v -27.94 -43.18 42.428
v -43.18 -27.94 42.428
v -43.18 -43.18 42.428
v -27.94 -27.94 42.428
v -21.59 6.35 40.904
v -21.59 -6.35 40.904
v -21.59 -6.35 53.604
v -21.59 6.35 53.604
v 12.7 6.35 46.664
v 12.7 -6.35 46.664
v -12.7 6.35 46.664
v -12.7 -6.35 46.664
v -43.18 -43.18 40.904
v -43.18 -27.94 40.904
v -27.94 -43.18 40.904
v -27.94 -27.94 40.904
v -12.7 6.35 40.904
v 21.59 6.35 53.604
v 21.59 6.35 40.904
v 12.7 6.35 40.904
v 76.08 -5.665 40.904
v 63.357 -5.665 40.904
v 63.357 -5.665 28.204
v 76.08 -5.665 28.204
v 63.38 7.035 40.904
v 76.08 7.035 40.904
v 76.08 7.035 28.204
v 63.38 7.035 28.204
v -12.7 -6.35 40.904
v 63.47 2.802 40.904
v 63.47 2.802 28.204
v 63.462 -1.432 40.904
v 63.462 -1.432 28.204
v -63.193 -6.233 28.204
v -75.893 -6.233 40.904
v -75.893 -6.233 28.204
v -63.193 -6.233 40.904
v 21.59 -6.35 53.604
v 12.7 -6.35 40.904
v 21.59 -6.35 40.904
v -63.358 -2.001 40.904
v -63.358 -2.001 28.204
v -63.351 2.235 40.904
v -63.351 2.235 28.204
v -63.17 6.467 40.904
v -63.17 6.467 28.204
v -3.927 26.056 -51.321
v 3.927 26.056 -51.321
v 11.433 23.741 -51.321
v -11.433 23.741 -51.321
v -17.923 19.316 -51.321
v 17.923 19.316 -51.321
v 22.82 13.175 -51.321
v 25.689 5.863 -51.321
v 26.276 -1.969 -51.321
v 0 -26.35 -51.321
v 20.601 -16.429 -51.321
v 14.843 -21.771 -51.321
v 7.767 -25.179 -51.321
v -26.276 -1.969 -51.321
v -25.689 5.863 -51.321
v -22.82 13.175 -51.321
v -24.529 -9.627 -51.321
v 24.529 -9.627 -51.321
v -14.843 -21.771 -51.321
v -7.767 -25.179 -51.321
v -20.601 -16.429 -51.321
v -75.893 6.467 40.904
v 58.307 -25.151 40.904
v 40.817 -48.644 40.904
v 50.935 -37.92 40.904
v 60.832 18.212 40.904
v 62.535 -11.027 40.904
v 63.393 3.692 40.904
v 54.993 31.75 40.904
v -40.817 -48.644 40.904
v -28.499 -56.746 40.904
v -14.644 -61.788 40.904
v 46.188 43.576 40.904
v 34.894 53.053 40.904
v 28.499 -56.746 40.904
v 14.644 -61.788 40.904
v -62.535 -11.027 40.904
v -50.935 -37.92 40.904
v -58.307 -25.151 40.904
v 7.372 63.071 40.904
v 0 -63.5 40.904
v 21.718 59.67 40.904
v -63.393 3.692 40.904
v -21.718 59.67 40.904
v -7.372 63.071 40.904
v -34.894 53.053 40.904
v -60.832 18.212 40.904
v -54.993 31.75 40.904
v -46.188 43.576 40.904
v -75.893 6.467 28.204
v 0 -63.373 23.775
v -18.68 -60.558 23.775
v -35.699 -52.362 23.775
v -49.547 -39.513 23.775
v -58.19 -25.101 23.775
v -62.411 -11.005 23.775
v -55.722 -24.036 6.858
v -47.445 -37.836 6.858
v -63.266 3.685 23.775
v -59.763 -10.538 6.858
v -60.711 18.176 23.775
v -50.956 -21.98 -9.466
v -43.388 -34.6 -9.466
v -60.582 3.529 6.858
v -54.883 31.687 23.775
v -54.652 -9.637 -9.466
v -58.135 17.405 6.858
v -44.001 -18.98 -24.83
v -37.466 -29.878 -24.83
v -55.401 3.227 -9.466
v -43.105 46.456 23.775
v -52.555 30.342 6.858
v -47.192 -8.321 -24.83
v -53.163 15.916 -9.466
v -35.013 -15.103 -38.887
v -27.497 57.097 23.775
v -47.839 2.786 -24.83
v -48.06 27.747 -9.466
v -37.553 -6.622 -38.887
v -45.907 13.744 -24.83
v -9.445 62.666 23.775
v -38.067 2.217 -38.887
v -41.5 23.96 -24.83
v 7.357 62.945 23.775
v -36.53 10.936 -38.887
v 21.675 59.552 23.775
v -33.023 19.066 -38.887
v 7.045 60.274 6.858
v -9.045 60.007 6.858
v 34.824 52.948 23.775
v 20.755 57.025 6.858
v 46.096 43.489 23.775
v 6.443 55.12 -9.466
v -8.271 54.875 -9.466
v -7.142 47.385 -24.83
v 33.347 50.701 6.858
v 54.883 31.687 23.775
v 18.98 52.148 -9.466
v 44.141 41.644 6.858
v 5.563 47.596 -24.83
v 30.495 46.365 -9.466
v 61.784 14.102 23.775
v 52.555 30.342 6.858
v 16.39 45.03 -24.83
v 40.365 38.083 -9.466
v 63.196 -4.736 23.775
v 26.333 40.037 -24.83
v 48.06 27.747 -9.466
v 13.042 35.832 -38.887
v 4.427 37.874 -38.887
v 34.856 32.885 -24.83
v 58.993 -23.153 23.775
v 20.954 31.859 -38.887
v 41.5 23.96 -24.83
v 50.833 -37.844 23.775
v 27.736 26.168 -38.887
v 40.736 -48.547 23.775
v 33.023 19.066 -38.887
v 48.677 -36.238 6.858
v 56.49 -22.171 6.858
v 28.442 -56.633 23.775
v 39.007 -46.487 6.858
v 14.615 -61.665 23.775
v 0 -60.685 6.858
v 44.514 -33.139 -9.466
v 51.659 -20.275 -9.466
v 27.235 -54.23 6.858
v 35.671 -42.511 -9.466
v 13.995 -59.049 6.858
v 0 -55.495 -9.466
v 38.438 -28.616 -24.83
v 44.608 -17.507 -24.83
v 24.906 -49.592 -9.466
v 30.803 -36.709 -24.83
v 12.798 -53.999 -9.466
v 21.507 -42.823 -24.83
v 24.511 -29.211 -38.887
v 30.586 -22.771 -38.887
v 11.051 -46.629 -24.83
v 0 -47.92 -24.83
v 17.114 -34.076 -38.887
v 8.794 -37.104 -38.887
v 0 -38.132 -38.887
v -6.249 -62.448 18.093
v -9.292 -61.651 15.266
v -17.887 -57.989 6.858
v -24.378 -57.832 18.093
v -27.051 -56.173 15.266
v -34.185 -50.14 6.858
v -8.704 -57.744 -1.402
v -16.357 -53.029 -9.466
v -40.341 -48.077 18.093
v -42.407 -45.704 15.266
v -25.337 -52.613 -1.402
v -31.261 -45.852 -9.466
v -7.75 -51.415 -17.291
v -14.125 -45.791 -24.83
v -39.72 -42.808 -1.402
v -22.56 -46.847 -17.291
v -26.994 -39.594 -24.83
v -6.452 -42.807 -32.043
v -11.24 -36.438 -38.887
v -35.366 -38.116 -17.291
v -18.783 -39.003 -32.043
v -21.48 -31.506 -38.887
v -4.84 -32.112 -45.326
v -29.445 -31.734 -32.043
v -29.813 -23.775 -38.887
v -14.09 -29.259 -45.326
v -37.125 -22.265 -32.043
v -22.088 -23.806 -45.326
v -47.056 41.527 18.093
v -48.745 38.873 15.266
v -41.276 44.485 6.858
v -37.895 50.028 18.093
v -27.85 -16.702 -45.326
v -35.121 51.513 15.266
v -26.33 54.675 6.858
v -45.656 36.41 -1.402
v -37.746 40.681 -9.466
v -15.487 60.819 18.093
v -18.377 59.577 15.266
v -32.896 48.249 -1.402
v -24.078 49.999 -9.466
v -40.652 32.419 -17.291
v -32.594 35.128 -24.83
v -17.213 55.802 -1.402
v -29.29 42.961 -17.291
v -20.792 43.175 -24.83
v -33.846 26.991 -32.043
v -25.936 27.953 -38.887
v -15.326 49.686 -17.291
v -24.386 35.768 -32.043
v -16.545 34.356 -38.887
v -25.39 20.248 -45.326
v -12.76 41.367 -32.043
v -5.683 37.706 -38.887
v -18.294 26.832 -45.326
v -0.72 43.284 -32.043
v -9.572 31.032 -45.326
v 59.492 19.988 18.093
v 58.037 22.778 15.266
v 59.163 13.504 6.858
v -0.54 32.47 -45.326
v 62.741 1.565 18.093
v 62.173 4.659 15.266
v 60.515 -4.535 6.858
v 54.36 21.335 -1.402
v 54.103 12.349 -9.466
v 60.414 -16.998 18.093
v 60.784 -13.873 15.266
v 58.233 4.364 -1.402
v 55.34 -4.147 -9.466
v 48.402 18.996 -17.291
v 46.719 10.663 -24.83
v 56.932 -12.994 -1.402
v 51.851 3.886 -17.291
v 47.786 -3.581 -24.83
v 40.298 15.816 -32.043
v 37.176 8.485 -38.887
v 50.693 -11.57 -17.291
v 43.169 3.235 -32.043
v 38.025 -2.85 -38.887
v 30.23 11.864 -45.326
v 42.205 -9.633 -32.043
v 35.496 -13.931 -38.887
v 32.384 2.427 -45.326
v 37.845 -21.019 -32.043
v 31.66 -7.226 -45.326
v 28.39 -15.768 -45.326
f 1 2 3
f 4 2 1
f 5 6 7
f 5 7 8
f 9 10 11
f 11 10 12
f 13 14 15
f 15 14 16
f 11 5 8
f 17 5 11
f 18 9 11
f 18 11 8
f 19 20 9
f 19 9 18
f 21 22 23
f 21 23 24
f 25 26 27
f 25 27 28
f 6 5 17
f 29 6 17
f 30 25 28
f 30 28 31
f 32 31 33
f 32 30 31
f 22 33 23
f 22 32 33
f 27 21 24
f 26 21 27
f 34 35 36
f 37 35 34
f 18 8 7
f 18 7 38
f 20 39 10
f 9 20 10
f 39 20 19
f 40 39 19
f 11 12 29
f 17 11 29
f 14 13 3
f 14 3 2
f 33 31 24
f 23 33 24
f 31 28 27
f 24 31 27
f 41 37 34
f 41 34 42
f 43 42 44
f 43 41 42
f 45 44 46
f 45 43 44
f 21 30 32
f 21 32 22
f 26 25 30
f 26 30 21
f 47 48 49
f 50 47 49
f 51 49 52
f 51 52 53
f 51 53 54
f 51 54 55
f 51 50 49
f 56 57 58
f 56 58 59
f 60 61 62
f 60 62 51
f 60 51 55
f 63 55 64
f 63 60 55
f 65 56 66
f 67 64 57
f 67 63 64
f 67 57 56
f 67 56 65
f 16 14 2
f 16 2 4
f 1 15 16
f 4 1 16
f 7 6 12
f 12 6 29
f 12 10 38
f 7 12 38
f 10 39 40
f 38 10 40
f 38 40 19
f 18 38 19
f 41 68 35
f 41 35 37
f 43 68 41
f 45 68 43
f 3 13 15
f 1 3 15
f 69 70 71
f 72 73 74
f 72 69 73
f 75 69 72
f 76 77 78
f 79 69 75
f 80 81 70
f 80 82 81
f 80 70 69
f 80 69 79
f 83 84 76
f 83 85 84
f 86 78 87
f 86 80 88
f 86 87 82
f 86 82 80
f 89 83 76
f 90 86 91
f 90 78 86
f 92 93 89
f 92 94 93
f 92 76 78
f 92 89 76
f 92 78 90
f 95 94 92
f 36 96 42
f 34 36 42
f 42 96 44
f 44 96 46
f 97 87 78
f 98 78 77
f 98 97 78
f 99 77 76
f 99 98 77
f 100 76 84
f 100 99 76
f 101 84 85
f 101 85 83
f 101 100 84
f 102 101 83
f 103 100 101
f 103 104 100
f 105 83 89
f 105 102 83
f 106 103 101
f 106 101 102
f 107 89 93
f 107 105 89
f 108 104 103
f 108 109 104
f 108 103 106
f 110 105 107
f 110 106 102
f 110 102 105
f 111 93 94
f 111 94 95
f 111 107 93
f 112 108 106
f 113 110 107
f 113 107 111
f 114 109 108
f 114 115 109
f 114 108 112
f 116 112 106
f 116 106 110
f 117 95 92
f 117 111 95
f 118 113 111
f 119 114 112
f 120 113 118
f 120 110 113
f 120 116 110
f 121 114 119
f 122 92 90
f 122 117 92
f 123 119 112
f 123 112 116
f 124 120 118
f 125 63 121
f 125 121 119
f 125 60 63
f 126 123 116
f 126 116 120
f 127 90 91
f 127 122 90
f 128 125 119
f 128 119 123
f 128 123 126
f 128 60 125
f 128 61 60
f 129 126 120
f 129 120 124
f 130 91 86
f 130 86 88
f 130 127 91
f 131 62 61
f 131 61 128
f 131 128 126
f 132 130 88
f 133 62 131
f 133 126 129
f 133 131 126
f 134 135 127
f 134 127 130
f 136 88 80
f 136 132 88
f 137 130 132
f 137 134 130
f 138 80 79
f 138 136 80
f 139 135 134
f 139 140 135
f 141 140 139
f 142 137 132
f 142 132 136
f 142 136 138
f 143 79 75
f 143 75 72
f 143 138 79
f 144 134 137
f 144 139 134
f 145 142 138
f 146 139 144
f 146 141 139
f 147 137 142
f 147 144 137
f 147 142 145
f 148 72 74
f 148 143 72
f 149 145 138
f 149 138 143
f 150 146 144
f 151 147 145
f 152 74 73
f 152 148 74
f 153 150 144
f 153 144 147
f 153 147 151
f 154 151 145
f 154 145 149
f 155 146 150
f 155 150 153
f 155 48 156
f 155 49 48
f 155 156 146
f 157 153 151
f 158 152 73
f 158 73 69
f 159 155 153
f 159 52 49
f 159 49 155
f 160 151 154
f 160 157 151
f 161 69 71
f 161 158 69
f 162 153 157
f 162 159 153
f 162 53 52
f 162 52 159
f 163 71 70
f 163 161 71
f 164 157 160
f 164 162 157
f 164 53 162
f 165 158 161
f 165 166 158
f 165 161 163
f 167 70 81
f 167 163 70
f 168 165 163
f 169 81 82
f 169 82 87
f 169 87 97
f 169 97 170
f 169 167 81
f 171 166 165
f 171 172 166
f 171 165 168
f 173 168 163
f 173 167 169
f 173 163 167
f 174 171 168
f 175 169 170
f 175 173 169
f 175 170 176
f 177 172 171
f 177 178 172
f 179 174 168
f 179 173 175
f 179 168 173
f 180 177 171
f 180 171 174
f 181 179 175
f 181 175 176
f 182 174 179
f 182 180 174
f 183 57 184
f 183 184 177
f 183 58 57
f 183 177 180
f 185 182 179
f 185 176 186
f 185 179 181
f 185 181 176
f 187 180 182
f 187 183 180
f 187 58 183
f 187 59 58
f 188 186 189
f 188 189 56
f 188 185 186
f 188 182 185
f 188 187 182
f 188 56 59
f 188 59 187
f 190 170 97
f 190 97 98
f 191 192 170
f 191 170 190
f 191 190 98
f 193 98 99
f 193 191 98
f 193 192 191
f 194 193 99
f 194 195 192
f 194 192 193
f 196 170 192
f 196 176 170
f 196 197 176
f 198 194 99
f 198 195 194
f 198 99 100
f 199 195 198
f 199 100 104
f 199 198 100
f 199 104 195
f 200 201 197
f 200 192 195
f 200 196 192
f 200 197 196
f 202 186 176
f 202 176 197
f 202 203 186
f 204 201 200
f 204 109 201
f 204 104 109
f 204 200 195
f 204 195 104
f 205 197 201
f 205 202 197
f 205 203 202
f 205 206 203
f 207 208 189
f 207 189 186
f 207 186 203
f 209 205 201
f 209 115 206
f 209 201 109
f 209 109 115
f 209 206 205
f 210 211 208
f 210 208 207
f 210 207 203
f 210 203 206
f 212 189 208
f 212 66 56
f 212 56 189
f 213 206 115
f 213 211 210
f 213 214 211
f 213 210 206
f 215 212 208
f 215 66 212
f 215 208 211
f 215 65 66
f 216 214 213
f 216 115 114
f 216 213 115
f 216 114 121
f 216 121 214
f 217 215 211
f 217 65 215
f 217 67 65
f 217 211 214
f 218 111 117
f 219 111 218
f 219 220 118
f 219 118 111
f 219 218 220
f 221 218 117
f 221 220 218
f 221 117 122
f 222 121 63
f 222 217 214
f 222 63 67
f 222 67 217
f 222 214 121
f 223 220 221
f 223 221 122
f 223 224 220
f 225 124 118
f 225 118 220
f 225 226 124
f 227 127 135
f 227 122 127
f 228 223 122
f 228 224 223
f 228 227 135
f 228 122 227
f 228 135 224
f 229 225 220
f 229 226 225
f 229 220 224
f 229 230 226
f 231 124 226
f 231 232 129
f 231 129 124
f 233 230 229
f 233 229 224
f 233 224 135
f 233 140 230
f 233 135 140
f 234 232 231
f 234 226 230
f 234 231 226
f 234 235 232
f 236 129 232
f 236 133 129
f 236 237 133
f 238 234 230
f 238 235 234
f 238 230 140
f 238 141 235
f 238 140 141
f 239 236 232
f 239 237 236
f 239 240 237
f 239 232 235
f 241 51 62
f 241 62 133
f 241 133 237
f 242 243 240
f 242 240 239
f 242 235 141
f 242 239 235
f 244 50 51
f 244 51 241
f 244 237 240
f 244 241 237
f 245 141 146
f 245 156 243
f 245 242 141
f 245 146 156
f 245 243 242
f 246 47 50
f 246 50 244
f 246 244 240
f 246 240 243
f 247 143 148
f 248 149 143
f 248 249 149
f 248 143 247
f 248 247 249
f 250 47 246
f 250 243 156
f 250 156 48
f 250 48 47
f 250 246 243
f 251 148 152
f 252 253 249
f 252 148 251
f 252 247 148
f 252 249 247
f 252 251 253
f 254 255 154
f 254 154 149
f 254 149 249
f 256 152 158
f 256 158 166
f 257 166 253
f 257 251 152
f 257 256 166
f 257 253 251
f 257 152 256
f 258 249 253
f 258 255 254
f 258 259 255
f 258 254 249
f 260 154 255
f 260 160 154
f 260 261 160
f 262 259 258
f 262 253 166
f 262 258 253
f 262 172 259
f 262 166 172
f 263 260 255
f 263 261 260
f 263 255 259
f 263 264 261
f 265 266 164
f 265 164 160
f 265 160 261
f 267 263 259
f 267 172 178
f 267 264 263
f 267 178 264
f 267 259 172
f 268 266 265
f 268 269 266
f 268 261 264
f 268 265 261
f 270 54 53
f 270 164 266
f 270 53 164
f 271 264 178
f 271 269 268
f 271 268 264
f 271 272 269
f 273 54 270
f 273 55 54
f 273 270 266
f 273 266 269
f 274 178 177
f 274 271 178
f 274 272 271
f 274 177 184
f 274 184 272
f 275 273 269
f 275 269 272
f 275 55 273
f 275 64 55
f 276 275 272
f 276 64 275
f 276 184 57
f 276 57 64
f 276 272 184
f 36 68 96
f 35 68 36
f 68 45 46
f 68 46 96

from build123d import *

# Parameters (mm, degrees)
F2_W      = 43.18
F2_H      = 12.7
F3_DEPTH  = 12.7
F5_DEPTH  = 25.4
F6_W      = 15.24
F6_H      = 15.24
F7_DEPTH  = 1.524
F10_DEPTH = 12.7
F11_DEPTH = 12.7


with BuildPart() as f1:
    # F0 (on Right) → F1 (revolve)
    with BuildSketch(Plane.YZ):
        with BuildLine():
            Line((0, -51.321191), (0, 40.903755))
            Line((0, 40.903755), (-63.5, 40.903755))
            ThreePointArc((-63.5, 40.903755), (-55.494811, -9.466448), (-26.349985, -51.321191))
            Line((-26.349985, -51.321191), (0, -51.321191))
        make_face()
    revolve(axis=Axis((0, 0, -5.208718), (0, 0, -1)))


with BuildPart() as f3:
    # F2 (on face) → F3 (new body)
    with BuildSketch(Plane.XY.offset(40.903755)):
        Rectangle(F2_W, F2_H)
    extrude(amount=F3_DEPTH)

    # F4 (on face) → F5 (cut)
    with BuildSketch(Plane.XZ.offset(6.35)):
        Polygon((-12.7, 40.903755), (0, 40.903755), (12.7, 40.903755), (12.7, 46.664163), (-12.7, 46.664163), align=None)
    extrude(amount=-F5_DEPTH, mode=Mode.SUBTRACT)


with BuildPart() as f7:
    # F6 (on face) → F7 (new body)
    with BuildSketch(Plane.XY.offset(40.903755)):
        with Locations((-35.56, -35.56)):
            Rectangle(F6_W, F6_H)
    extrude(amount=F7_DEPTH)


with BuildPart() as f10:
    # F8 (on face) → F10 (new body)
    with BuildSketch(Plane.XY.offset(40.903755)):
        with BuildLine():
            Line((-75.893349, 6.466974), (-75.893349, 0.116974))
            Line((-75.893349, 0.116974), (-75.893349, -6.233026))
            Line((-75.893349, -6.233026), (-63.193349, -6.233026))
            ThreePointArc((-63.193349, -6.233026), (-63.37619, 0.117334), (-63.169837, 6.466974))
            Line((-63.169837, 6.466974), (-75.893349, 6.466974))
        make_face()
    extrude(amount=-F10_DEPTH)


with BuildPart() as f11:
    # F9 (on face) → F11 (new body)
    with BuildSketch(Plane.XY.offset(40.903755)):
        with BuildLine():
            Line((76.080086, -5.664869), (76.080086, 0.685131))
            Line((76.080086, 0.685131), (76.080086, 7.035131))
            Line((76.080086, 7.035131), (63.380086, 7.035131))
            ThreePointArc((63.380086, 7.035131), (63.477788, 0.684929), (63.356573, -5.664869))
            Line((63.356573, -5.664869), (76.080086, -5.664869))
        make_face()
    extrude(amount=-F11_DEPTH)


solid = Compound([f1.part, f3.part, f7.part, f10.part, f11.part])
